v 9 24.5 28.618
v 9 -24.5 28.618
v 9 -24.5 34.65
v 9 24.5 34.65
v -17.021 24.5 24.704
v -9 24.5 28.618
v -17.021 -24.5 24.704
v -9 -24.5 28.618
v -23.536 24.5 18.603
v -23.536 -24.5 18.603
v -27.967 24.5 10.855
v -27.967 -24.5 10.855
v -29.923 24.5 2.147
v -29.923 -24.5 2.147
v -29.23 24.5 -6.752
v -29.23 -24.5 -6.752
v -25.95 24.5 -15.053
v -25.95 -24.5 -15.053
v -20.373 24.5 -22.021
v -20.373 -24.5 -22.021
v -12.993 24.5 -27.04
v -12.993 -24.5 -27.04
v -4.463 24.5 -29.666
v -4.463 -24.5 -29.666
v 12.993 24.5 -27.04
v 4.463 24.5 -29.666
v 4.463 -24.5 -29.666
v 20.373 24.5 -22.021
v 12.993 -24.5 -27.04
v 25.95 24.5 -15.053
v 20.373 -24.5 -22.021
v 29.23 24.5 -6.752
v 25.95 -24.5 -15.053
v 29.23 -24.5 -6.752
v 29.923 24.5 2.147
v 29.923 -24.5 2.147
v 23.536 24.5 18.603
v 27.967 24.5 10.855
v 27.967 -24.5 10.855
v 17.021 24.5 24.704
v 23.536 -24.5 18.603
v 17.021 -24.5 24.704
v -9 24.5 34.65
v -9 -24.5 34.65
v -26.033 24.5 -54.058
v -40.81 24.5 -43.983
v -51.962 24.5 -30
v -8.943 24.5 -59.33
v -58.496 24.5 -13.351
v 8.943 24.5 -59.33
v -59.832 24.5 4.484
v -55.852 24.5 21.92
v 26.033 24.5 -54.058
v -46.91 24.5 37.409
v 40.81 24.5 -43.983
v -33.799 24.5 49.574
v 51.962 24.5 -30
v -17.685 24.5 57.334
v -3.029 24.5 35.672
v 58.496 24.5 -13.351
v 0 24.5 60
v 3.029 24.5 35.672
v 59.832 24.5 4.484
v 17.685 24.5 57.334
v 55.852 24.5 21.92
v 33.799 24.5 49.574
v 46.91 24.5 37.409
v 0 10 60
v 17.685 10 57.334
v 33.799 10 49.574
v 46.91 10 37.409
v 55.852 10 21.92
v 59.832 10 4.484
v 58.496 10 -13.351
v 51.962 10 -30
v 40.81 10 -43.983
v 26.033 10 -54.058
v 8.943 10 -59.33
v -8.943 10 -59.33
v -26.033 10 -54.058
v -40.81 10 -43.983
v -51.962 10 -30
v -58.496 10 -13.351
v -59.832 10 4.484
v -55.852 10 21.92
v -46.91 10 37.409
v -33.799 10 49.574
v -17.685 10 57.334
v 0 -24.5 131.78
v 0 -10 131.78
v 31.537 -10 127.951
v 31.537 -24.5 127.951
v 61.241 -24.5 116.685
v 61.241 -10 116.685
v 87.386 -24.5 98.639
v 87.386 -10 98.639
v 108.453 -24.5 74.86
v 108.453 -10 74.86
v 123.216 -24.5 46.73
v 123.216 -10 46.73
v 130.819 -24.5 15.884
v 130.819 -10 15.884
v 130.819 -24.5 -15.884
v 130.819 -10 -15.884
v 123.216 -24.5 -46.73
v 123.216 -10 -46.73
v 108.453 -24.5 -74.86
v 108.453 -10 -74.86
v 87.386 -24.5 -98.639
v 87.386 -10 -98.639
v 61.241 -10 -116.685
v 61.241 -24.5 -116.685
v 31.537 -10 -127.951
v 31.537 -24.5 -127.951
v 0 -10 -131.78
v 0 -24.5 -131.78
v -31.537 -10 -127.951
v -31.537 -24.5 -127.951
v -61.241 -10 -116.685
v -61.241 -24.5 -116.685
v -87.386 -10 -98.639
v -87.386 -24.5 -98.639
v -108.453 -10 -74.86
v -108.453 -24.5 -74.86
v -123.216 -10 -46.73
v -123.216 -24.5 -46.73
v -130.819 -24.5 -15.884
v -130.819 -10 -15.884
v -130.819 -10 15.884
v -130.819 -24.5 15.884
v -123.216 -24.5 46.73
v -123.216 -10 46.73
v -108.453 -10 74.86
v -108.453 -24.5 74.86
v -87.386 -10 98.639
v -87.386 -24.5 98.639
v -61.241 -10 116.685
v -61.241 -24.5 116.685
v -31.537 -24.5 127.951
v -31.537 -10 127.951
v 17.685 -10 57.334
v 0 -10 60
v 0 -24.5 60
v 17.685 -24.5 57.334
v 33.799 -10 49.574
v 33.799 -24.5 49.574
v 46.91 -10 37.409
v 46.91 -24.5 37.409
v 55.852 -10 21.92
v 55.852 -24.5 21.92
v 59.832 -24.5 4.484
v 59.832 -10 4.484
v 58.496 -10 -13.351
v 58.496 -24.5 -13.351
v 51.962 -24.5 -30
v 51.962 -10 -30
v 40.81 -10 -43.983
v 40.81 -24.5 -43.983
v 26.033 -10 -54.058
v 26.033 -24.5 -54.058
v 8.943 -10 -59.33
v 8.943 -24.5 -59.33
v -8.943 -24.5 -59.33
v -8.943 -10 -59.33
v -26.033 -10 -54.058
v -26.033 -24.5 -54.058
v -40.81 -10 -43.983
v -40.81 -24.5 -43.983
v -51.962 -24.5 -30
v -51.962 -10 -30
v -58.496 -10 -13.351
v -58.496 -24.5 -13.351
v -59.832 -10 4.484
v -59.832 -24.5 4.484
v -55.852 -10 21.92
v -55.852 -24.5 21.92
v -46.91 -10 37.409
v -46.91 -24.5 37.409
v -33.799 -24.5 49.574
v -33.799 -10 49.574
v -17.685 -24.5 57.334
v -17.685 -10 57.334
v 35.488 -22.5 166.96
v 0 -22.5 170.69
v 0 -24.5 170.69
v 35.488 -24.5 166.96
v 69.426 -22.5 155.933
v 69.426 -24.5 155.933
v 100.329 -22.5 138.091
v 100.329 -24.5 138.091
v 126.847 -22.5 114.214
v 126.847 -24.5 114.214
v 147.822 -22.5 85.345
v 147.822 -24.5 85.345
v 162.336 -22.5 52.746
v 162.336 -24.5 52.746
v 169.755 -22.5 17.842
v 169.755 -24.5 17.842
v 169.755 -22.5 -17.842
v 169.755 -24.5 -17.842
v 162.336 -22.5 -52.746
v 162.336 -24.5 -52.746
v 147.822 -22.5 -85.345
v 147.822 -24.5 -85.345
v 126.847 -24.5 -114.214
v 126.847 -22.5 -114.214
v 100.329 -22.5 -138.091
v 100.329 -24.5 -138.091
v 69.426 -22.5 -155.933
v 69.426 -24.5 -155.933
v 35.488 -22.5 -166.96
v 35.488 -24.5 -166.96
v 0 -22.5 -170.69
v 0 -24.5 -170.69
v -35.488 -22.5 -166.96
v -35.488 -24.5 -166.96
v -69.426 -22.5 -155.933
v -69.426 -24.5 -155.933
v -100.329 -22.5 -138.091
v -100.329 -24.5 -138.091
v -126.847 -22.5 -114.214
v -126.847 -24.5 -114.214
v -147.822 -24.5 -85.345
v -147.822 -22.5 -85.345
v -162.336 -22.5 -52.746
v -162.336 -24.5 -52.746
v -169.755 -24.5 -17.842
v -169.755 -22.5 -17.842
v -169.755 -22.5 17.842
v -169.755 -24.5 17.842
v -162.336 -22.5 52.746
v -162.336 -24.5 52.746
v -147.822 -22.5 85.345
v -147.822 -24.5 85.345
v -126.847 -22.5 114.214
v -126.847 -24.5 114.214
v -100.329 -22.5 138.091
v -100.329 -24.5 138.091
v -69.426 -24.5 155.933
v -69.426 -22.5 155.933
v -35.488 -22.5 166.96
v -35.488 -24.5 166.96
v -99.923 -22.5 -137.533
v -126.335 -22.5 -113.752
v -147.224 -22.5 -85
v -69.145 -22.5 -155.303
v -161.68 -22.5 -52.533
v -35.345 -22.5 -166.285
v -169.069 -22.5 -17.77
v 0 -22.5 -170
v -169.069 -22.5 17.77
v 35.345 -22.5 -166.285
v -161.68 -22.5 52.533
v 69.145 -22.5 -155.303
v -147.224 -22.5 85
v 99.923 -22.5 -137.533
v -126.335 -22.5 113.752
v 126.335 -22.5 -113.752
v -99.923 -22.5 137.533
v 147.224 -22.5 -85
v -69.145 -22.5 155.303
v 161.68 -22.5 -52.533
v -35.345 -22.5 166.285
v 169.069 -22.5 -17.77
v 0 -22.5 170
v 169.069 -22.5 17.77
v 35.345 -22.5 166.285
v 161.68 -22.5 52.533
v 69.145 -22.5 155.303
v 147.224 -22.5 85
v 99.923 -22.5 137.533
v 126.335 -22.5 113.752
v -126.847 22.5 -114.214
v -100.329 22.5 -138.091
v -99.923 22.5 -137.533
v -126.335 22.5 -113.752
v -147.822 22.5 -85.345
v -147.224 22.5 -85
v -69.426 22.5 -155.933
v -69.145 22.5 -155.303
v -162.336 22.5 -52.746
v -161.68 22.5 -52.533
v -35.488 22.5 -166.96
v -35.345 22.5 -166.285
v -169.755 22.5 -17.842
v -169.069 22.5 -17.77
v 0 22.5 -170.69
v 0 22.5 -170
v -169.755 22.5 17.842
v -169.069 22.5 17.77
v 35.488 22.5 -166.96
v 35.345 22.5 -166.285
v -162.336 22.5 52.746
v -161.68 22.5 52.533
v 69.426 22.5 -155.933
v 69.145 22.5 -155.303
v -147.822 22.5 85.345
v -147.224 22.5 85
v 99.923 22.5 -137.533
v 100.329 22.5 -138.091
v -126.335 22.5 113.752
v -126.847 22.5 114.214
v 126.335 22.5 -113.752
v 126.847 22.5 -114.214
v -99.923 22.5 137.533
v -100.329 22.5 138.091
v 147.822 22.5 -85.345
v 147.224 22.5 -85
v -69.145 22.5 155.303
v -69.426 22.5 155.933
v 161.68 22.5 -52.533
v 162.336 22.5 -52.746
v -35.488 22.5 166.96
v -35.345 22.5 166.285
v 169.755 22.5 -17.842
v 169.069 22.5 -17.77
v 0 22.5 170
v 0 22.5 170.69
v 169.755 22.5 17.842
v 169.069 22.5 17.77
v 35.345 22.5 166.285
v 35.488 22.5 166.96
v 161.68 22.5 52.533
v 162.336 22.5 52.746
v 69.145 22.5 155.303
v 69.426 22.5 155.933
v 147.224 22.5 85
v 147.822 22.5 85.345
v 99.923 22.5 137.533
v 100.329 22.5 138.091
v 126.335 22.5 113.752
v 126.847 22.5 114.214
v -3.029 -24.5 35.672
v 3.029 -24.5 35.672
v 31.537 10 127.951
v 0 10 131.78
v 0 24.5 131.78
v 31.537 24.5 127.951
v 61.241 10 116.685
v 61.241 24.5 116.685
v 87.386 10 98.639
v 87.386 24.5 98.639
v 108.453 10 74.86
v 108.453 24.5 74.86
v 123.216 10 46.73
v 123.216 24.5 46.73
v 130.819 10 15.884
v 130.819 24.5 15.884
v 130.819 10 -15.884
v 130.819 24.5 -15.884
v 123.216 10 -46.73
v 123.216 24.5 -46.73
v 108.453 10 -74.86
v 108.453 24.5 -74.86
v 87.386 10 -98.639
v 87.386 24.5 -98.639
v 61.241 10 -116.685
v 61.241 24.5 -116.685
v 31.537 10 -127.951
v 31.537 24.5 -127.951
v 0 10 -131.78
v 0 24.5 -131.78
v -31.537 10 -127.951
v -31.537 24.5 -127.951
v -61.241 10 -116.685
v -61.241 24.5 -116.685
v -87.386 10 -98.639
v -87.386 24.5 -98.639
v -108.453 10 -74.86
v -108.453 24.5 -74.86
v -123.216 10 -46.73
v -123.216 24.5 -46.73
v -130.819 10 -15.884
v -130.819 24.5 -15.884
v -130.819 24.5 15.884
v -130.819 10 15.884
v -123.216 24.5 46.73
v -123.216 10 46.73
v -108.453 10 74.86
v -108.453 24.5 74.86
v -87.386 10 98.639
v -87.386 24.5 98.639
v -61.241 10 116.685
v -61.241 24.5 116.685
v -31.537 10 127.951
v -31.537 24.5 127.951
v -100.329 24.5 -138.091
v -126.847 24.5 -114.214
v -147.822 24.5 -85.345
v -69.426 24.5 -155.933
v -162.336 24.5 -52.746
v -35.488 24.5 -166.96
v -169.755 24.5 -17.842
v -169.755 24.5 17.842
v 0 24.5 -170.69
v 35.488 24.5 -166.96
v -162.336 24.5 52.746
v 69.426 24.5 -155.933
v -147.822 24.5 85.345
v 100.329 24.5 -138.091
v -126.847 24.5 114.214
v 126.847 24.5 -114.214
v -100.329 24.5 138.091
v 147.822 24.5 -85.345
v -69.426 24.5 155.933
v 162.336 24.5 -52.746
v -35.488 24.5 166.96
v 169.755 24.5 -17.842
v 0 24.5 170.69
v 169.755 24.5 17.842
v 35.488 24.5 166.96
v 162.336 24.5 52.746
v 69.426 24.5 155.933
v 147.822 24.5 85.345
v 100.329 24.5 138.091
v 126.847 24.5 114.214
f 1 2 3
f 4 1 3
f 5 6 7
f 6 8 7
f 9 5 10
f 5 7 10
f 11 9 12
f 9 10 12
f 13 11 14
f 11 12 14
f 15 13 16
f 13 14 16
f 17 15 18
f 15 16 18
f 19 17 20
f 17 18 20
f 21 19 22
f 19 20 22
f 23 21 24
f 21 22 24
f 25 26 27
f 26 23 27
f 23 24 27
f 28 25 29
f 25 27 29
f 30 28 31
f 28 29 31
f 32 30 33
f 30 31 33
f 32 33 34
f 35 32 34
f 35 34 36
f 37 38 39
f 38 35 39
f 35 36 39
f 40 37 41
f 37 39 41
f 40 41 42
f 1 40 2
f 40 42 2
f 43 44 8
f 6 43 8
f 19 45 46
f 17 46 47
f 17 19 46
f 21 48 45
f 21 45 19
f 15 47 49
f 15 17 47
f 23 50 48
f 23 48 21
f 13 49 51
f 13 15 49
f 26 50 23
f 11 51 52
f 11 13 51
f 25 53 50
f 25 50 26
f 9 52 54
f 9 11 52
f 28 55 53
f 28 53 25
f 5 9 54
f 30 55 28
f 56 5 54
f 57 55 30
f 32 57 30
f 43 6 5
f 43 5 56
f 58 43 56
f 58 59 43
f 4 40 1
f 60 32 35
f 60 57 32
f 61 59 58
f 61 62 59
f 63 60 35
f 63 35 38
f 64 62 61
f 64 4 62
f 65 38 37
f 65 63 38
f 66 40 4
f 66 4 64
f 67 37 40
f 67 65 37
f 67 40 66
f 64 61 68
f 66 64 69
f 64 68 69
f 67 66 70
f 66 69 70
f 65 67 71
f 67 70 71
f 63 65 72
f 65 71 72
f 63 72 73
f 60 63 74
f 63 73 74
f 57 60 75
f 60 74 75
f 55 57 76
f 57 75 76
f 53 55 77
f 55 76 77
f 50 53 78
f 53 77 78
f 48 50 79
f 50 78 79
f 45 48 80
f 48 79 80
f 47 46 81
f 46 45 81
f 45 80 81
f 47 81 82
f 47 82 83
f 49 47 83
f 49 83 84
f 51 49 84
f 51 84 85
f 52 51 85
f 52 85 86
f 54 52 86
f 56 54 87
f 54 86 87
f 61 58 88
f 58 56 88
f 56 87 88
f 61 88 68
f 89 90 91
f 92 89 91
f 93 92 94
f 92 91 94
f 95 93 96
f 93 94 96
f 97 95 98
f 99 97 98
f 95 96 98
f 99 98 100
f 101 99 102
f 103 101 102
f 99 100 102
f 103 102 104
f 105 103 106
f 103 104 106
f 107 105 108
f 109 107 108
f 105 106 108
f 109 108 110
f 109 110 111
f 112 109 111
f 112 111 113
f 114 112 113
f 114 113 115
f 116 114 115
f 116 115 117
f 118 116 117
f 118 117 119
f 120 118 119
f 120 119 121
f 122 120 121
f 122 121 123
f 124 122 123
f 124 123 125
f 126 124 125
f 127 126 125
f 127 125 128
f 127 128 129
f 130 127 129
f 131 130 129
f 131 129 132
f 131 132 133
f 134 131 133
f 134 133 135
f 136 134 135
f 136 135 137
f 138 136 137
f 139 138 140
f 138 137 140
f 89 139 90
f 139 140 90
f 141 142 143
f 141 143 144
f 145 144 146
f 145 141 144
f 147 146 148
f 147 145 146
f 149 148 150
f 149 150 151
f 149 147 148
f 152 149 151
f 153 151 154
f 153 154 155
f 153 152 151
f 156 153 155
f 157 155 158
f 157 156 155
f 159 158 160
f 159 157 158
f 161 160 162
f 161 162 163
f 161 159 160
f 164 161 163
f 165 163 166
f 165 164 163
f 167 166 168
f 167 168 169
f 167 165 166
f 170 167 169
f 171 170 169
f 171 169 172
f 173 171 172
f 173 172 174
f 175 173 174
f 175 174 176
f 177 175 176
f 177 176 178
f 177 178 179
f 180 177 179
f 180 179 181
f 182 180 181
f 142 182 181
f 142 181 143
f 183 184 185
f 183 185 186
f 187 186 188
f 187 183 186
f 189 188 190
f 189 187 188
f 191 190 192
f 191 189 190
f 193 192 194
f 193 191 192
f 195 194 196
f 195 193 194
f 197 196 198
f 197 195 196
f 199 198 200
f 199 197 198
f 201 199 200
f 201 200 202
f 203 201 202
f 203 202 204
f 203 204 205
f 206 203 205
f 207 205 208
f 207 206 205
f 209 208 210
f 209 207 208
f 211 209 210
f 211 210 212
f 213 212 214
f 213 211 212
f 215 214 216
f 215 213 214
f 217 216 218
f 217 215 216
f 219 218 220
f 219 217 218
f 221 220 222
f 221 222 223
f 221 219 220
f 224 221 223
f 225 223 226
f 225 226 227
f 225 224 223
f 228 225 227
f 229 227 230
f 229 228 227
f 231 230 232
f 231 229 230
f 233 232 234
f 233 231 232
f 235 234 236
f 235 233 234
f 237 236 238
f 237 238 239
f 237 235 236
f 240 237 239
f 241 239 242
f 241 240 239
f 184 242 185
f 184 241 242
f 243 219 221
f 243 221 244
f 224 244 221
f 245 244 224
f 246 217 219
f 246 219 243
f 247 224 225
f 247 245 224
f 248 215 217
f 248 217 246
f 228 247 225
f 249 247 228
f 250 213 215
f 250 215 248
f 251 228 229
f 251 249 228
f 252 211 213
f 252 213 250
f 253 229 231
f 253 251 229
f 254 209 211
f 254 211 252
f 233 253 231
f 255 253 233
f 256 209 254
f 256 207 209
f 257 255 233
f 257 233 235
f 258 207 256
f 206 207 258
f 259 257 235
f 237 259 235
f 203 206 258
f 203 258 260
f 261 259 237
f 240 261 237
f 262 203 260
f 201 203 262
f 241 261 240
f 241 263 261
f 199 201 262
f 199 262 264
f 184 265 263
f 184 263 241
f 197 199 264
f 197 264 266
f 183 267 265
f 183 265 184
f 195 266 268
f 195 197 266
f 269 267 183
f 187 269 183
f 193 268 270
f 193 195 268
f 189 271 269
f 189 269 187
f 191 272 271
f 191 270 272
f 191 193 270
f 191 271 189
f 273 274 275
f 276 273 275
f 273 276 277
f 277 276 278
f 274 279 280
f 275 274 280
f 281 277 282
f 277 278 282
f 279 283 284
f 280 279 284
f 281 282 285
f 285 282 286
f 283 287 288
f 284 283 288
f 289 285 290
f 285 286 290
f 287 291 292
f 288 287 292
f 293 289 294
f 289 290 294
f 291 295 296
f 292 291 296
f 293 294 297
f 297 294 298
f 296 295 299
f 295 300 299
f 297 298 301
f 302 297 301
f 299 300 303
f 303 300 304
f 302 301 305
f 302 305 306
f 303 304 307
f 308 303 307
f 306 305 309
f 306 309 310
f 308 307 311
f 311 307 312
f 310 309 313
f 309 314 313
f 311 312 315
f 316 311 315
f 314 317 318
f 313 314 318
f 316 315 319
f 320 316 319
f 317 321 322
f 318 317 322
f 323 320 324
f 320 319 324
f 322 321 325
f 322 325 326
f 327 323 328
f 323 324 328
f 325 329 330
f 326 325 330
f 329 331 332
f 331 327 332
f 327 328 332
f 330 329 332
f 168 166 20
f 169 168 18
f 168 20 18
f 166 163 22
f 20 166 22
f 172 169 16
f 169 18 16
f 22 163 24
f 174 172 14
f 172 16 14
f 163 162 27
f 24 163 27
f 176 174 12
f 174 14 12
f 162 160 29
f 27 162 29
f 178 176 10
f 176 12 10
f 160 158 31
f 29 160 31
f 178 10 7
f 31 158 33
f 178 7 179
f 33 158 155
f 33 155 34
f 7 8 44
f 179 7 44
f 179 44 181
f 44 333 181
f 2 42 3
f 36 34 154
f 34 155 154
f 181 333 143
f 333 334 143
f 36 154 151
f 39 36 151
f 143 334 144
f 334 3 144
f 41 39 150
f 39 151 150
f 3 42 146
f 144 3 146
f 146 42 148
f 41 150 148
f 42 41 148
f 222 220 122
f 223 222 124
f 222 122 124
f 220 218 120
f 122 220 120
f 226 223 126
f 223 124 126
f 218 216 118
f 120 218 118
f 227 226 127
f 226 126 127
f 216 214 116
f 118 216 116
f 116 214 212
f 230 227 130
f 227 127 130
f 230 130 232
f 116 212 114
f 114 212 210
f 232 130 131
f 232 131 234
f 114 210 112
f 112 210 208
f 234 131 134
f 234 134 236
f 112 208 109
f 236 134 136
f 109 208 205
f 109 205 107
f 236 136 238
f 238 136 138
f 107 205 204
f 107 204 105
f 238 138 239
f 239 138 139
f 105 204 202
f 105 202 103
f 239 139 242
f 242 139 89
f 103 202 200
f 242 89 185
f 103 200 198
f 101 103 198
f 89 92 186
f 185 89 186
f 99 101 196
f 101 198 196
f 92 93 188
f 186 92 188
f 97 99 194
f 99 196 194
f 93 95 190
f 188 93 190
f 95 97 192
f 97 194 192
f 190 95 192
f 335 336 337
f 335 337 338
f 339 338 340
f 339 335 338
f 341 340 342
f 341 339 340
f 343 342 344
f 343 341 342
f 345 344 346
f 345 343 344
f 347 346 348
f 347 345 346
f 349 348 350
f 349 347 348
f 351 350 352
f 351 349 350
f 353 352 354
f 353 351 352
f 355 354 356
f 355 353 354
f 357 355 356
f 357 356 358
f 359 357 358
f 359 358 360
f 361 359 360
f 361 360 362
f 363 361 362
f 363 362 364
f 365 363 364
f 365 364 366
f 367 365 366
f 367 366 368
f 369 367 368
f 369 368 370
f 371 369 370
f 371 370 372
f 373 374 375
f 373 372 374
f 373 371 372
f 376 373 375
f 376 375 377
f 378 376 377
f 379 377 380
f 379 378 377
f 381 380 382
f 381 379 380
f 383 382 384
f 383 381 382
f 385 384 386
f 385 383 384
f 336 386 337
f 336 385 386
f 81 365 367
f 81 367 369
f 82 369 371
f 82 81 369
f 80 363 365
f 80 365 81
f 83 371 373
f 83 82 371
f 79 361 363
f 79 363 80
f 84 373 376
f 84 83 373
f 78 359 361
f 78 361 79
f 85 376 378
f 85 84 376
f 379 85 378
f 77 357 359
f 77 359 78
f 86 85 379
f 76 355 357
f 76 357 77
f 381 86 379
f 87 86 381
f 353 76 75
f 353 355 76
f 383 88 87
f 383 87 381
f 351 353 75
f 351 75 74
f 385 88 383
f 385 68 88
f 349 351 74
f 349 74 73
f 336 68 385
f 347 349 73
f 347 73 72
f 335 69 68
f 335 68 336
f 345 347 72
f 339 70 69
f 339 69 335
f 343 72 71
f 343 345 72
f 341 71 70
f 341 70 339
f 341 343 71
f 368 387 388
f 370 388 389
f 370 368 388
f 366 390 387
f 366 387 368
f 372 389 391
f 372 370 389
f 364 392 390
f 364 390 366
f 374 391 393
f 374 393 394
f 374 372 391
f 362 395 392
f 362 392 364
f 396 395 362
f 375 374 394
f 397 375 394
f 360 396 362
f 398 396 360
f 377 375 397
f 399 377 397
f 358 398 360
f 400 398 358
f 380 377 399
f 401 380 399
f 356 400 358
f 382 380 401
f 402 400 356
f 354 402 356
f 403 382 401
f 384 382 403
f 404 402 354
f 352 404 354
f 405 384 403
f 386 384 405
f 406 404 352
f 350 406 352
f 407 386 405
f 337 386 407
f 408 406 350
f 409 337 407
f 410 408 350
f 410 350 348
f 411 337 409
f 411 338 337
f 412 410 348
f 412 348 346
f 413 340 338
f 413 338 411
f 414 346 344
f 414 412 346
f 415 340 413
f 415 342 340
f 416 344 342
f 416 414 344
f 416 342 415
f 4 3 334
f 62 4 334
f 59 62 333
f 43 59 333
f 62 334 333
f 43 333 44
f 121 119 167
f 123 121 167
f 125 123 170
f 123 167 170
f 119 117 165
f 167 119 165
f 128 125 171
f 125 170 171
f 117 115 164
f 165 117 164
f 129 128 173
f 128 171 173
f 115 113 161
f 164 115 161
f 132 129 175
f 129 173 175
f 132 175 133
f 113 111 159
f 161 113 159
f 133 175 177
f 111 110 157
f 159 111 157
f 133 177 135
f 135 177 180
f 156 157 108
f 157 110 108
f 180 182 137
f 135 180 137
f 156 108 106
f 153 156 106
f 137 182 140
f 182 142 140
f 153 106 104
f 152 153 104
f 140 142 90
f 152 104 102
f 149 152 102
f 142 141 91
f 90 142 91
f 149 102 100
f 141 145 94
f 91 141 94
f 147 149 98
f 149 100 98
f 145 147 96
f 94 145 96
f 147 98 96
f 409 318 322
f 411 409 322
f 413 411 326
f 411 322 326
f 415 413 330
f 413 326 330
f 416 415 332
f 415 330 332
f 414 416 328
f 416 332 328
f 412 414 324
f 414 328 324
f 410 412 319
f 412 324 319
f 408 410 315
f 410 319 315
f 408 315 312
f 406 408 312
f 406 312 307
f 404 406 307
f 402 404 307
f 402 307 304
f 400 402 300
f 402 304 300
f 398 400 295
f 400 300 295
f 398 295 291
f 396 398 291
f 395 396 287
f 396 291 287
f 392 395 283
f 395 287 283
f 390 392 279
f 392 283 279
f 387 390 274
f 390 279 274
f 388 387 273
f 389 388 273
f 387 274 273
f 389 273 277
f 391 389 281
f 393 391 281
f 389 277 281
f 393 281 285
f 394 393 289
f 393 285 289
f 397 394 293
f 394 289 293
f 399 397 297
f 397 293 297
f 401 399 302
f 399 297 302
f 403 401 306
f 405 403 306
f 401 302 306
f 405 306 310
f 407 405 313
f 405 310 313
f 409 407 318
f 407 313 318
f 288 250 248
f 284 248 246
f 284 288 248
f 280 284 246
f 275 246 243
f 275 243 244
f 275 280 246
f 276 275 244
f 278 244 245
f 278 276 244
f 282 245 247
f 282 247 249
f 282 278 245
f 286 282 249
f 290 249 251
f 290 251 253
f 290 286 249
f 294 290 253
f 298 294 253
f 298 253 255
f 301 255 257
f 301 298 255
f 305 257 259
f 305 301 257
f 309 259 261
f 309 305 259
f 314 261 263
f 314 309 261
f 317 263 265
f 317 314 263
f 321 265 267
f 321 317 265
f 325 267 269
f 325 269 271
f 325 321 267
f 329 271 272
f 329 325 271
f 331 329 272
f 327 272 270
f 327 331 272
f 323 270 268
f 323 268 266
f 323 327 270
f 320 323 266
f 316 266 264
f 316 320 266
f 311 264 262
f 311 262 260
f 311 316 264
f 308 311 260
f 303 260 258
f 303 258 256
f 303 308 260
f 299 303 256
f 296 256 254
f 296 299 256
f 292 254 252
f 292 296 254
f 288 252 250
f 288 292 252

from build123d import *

# Parameters (mm, degrees)
SKETCH1_R           = 170
BOSS_EXTRUDE1_DEPTH = 22.5
SKETCH2_R           = 170.69
BOSS_EXTRUDE2_DEPTH = 2
CUT_EXTRUDE1_START  = -10
SKETCH3_R           = 131.78
SKETCH3_R_2         = 60
CUT_EXTRUDE1_DEPTH  = 233.632236523
SKETCH4_R           = 30
CUT_EXTRUDE2_DEPTH  = 247.315148133
CUT_EXTRUDE3_DEPTH  = 247.315148133


with BuildPart() as part:
    # Sketch1 → Boss-Extrude1 (new, symmetric)
    with BuildSketch(Plane(origin=(0, 0, 0), x_dir=(1, 0, 0), z_dir=(0, 1, 0))):
        with Locations(Location((0, 0, 0), (0, 0, 90))):
            Circle(SKETCH1_R)
    extrude(amount=BOSS_EXTRUDE1_DEPTH, both=True)

    # Sketch2 → Boss-Extrude2 (add)
    with BuildSketch(Plane(origin=(0, 22.5, 0), x_dir=(1, 0, 0), z_dir=(0, 1, 0))):
        with Locations(Location((0, 0, 0), (0, 0, 270))):
            Circle(SKETCH2_R)
    boss_extrude2 = extrude(amount=BOSS_EXTRUDE2_DEPTH)

    # Mirror1: Boss-Extrude2 across plane
    add(boss_extrude2.mirror(Plane.ZX))

    # Sketch3 → Cut-Extrude1 (cut, through all)
    with BuildSketch(Plane(origin=(0, 0, 0), x_dir=(1, 0, 0), z_dir=(0, 1, 0)).offset(CUT_EXTRUDE1_START)):
        with Locations(Location((0, 0, 0), (0, 0, 270))):
            Circle(SKETCH3_R)
        with Locations(Location((0, 0, 0), (0, 0, 270))):
            Circle(SKETCH3_R_2, mode=Mode.SUBTRACT)
    cut_extrude1 = extrude(amount=-CUT_EXTRUDE1_DEPTH, mode=Mode.SUBTRACT)

    # Mirror3: Cut-Extrude1 across plane
    add(cut_extrude1.mirror(Plane.ZX), mode=Mode.SUBTRACT)

    # Sketch4 → Cut-Extrude2 (cut, through all)
    with BuildSketch(Plane.XZ.offset(24.5)):
        with Locations(Location((0, 0, 0), (0, 0, 270))):
            Circle(SKETCH4_R)
    extrude(amount=-CUT_EXTRUDE2_DEPTH, mode=Mode.SUBTRACT)

    # Sketch5 → Cut-Extrude3 (cut, through all)
    with BuildSketch(Plane.XZ.offset(24.5)):
        with BuildLine():
            Line((-9, 34.650252524), (-9, 18.069809638))
            Line((-9, 18.069809638), (9, 18.069809638))
            Line((9, 18.069809638), (9, 34.650252524))
            ThreePointArc((9, 34.650252524), (0, 35.8), (-9, 34.650252524))
        make_face()
    extrude(amount=-CUT_EXTRUDE3_DEPTH, mode=Mode.SUBTRACT)


solid = part.part
